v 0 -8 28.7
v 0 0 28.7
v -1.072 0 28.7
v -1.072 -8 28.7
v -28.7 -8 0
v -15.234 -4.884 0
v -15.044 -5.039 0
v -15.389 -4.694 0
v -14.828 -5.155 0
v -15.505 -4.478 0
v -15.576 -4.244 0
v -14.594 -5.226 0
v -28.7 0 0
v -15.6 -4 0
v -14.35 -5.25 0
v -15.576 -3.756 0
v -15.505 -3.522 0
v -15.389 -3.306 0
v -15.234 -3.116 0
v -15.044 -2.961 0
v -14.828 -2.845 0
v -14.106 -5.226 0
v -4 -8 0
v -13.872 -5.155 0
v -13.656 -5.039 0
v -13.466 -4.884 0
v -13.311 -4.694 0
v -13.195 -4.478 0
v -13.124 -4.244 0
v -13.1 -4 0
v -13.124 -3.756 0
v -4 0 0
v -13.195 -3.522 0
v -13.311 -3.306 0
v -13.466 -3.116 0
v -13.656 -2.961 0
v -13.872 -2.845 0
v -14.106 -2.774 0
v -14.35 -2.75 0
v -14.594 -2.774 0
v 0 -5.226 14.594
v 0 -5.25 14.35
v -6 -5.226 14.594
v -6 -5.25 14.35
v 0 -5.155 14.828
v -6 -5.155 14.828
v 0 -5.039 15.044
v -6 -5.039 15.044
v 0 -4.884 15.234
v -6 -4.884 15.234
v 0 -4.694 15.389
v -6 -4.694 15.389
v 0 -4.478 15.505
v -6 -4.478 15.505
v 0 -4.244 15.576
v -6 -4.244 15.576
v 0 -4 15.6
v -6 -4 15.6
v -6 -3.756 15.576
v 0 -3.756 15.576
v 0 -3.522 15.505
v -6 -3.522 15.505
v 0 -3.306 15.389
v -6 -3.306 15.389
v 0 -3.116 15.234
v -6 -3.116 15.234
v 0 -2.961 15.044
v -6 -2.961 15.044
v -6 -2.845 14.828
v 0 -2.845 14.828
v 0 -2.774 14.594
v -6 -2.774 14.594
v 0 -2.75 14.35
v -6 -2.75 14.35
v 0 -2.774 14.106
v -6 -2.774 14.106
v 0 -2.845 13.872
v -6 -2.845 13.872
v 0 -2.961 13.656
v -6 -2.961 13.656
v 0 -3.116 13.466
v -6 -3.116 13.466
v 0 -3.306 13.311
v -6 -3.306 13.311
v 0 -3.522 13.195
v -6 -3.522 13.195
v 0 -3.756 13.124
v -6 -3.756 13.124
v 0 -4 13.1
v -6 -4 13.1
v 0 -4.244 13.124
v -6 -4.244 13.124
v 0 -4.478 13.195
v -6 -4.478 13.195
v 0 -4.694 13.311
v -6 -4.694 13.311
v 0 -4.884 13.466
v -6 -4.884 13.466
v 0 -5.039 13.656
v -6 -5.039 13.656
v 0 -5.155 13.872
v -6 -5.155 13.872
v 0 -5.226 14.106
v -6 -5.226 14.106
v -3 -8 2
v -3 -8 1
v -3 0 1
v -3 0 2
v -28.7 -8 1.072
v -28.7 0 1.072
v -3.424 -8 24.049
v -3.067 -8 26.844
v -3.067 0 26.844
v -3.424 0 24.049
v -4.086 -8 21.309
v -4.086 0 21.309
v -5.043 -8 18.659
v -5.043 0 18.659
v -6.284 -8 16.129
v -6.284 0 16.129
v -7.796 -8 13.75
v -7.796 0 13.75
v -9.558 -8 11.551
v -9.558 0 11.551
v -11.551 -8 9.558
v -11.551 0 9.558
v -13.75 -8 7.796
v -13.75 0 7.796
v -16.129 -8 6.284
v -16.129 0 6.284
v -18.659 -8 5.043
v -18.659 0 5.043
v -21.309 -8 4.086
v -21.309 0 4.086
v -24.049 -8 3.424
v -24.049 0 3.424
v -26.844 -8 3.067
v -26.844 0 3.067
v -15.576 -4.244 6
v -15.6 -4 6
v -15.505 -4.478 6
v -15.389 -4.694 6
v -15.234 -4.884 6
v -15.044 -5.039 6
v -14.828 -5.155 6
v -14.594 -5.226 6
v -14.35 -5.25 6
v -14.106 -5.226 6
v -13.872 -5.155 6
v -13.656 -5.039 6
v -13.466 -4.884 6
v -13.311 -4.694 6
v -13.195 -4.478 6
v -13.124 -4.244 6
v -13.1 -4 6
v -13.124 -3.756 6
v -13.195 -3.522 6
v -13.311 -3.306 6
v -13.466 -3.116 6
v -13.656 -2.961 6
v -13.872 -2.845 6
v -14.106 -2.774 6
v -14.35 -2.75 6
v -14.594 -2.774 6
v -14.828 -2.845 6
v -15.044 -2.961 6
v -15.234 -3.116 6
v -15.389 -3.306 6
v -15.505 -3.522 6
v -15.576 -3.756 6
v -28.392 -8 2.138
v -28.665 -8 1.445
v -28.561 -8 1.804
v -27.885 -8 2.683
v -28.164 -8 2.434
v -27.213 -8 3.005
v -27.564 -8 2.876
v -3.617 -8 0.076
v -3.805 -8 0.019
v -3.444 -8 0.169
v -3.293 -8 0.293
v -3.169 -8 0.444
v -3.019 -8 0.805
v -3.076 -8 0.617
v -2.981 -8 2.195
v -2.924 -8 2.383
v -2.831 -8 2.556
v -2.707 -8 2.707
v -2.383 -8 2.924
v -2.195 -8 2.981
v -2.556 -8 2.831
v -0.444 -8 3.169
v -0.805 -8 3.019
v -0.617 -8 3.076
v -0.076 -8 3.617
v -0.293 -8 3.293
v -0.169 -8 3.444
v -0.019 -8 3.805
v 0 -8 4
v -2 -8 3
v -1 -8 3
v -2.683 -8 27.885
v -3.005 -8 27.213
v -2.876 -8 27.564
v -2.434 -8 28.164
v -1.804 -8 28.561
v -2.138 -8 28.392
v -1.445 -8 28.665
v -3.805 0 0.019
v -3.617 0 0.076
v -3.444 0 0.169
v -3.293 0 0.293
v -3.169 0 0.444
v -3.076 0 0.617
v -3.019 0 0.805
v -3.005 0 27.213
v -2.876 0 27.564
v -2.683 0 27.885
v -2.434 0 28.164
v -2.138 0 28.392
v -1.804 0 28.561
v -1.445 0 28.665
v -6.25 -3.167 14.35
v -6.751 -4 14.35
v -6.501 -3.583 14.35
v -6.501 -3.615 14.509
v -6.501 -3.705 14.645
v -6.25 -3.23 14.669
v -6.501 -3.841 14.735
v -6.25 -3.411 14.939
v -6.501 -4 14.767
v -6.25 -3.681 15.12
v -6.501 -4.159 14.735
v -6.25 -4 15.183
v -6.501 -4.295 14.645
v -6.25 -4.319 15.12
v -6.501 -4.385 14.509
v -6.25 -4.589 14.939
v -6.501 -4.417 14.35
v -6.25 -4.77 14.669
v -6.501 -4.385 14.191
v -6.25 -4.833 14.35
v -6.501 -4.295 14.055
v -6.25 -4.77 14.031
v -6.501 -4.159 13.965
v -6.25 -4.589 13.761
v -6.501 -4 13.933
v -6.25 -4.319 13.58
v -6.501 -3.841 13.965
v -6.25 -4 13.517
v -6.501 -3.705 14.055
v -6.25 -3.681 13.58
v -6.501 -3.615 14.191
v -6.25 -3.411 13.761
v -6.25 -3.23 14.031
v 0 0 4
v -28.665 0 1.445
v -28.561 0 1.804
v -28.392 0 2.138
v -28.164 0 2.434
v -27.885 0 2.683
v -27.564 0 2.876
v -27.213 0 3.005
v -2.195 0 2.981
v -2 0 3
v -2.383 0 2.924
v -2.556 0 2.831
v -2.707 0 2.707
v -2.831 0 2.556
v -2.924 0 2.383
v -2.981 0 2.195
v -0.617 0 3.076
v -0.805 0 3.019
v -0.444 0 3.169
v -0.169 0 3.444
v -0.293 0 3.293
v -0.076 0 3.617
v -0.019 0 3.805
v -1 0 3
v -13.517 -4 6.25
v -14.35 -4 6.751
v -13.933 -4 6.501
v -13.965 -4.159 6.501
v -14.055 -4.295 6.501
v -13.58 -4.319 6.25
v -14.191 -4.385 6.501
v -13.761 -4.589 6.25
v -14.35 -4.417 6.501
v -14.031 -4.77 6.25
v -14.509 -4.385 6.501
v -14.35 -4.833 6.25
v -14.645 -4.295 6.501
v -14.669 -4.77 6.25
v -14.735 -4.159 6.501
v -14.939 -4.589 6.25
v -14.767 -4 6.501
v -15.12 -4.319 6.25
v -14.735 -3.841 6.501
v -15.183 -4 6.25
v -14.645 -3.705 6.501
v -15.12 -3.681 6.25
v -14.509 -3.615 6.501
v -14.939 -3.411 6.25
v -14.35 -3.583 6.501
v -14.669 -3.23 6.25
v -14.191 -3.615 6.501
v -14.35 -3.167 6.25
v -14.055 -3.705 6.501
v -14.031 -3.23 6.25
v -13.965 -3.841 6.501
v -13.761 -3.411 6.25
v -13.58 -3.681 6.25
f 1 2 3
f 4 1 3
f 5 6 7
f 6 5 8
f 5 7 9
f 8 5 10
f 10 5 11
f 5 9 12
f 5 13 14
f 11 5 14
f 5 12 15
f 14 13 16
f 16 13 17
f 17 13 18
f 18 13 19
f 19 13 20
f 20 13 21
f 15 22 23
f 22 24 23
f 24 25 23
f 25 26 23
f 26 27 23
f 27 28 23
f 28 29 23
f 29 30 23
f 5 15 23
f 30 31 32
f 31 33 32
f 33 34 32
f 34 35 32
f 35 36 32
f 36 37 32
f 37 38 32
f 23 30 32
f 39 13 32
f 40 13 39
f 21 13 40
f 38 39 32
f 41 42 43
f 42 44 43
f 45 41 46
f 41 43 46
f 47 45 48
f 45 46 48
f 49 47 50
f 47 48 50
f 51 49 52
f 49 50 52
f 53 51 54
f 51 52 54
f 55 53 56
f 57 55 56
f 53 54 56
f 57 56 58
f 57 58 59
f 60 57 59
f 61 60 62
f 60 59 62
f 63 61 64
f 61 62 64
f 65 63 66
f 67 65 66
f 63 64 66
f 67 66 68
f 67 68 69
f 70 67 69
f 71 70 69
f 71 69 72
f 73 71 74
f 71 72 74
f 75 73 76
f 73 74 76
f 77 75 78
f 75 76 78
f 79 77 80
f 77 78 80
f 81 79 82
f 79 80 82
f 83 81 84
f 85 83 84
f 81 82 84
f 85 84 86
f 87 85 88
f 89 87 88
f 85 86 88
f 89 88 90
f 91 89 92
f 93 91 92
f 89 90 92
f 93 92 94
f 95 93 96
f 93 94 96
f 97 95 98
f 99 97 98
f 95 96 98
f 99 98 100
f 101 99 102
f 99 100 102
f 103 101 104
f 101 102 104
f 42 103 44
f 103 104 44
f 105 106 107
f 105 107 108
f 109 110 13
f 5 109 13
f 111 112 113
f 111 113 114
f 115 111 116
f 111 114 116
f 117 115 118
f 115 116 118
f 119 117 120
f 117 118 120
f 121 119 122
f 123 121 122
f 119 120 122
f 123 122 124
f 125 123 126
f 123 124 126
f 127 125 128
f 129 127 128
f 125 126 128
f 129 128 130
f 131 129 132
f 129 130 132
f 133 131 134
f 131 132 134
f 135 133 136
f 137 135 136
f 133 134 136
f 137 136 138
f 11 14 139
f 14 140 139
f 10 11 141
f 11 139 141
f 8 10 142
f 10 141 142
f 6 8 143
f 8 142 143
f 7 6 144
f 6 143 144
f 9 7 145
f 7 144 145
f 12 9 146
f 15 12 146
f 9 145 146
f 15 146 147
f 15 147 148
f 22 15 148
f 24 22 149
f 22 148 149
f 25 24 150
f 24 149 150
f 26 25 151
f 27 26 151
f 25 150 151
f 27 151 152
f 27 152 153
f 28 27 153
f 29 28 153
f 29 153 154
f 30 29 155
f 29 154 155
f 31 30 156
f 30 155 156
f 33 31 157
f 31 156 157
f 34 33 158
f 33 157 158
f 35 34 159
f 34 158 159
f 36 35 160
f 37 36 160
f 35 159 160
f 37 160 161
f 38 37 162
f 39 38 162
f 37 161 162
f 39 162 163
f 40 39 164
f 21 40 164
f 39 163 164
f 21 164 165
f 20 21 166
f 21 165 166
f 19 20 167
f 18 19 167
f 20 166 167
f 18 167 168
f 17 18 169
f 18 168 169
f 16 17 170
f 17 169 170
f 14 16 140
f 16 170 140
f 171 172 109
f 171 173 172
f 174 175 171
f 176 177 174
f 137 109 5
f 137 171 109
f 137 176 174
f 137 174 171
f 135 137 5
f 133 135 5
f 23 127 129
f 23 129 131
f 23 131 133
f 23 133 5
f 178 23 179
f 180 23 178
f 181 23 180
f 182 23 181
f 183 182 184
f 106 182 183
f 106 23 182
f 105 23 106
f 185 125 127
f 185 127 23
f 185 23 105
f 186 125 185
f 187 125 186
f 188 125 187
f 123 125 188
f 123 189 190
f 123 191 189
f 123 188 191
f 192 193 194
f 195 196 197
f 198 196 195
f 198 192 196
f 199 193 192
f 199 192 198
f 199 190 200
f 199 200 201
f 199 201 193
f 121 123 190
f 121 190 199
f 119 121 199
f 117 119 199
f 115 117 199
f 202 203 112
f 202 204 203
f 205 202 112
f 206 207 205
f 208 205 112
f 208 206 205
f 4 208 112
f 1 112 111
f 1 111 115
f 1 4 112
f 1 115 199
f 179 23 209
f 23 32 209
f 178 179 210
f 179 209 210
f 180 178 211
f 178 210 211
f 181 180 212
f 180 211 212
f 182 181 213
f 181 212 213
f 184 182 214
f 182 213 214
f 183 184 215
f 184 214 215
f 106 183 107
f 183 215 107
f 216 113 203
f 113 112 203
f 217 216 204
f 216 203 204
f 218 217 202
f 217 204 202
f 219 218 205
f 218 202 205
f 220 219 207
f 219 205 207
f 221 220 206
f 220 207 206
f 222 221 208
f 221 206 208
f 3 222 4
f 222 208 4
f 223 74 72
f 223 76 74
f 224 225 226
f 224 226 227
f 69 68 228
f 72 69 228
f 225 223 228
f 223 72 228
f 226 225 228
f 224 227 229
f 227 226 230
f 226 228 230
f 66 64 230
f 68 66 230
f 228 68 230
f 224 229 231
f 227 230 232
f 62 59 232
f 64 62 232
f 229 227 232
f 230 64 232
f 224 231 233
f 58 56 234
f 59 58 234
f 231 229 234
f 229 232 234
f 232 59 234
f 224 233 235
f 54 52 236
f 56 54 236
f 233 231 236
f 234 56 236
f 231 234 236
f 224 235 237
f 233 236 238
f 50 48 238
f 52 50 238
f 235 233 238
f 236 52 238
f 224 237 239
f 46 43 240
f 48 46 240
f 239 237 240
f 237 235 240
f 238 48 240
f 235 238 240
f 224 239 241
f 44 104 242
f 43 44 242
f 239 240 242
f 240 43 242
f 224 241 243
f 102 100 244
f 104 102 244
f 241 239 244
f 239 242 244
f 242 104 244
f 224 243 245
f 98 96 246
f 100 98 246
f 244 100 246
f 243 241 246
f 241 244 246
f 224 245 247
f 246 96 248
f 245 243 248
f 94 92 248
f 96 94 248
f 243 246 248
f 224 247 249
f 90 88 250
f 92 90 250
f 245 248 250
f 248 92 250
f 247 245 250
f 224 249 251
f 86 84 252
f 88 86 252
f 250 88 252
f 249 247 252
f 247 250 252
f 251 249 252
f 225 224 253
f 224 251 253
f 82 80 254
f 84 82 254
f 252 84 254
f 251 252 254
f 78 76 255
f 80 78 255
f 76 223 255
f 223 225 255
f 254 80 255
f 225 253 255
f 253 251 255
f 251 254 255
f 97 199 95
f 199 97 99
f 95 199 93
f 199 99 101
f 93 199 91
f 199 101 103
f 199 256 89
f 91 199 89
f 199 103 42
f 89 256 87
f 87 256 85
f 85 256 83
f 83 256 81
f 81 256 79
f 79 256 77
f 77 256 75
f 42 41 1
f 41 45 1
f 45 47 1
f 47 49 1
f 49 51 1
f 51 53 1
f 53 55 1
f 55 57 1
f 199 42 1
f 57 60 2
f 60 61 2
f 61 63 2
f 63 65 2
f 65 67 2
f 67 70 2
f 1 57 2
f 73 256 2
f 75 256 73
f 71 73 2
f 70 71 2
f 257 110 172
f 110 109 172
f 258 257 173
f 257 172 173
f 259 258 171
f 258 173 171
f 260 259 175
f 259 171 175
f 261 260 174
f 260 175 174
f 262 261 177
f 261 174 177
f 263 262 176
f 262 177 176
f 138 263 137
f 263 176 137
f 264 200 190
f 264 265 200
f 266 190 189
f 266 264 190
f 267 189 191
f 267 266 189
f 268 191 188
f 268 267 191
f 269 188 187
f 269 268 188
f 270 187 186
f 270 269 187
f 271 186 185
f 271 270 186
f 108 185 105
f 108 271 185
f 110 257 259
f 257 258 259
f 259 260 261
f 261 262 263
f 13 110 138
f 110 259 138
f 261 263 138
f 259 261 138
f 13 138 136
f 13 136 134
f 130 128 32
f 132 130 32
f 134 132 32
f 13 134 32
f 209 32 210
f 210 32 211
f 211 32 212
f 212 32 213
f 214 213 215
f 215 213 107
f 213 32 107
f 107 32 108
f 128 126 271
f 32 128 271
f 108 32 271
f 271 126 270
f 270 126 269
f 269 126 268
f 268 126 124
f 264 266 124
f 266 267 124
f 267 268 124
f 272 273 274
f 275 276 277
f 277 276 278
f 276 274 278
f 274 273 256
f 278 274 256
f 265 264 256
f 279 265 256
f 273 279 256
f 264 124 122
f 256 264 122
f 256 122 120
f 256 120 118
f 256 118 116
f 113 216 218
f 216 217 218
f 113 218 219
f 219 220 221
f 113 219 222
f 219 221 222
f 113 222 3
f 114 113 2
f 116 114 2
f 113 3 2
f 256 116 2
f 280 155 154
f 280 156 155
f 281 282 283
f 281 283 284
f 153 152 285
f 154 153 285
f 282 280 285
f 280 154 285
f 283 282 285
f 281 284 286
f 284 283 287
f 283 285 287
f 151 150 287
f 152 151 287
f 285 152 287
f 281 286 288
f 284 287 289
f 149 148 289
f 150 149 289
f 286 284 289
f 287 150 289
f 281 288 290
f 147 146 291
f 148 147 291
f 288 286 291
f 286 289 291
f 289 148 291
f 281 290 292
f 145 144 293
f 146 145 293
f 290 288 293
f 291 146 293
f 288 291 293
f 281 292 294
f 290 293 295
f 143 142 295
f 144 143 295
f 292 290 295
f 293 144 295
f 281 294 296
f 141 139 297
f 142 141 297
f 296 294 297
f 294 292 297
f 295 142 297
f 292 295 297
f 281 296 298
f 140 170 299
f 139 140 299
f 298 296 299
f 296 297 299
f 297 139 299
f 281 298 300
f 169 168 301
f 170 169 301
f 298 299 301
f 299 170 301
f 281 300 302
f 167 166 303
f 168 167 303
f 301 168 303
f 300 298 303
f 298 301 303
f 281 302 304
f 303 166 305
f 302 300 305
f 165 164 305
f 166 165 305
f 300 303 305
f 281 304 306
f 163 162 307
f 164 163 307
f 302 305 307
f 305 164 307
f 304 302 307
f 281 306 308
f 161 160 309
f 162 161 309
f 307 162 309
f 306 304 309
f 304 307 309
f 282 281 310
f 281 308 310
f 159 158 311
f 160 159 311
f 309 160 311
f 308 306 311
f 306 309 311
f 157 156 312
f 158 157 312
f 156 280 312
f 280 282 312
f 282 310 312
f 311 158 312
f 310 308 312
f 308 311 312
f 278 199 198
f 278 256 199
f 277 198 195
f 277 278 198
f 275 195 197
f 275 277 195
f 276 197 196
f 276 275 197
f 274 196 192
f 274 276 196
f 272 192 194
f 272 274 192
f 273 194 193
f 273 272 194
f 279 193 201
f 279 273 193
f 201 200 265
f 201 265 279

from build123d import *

# Parameters (mm, degrees)
F1_DEPTH = 8
F3_D     = 2.5
F3_DEPTH = 6
F3_TIP   = 0.7510757738
F5_D     = 2.5
F5_DEPTH = 6
F5_TIP   = 0.7510757738
F6_R     = 2
F7_W     = 3
F7_H     = 3
F8_DEPTH = 8.001
F9_R     = 1


with BuildPart() as f1:
    # F0 (on Front) → F1 (new body)
    with BuildSketch(Plane.XZ):
        with BuildLine():
            Line((-28.7, 0), (0, 0))
            Line((0, 0), (0, 28.7))
            Line((0, 28.7), (-3, 28.7))
            ThreePointArc((-3, 28.7), (-10.5273557235, 10.5273557235), (-28.7, 3))
            Line((-28.7, 3), (-28.7, 0))
        make_face()
    extrude(amount=F1_DEPTH)

    # F3
    with Locations(Plane.YZ):
        with Locations((-4, 14.35)):
            Hole(F3_D / 2, depth=F3_DEPTH)
            with Locations((0, 0, -(F3_DEPTH + F3_TIP / 2))):  # 118° drill point
                Cone(0, F3_D / 2, F3_TIP, mode=Mode.SUBTRACT)

    # F5
    with Locations(Plane(origin=(0, 0, 0), x_dir=(1, 0, 0), z_dir=(0, 0, -1))):
        with Locations((-14.35, 4)):
            Hole(F5_D / 2, depth=F5_DEPTH)
            with Locations((0, 0, -(F5_DEPTH + F5_TIP / 2))):  # 118° drill point
                Cone(0, F5_D / 2, F5_TIP, mode=Mode.SUBTRACT)

    # F6
    f6_edges = [f1.edges().sort_by_distance(p)[0] for p in [
        (-3, -4, 28.7),
        (-28.7, -4, 3),
    ]]
    fillet(f6_edges, radius=F6_R)

    # F7 (on face) → F8 (cut, through all)
    with BuildSketch(Plane.XZ.offset(8)):
        with Locations((-1.5, 1.5)):
            Rectangle(F7_W, F7_H)
    extrude(amount=-F8_DEPTH, mode=Mode.SUBTRACT)

    # F9
    f9_edges = [f1.edges().sort_by_distance(p)[0] for p in [
        (0, -4, 3),
        (-3, -4, 3),
        (-3, -4, 0),
    ]]
    fillet(f9_edges, radius=F9_R)


solid = f1.part
